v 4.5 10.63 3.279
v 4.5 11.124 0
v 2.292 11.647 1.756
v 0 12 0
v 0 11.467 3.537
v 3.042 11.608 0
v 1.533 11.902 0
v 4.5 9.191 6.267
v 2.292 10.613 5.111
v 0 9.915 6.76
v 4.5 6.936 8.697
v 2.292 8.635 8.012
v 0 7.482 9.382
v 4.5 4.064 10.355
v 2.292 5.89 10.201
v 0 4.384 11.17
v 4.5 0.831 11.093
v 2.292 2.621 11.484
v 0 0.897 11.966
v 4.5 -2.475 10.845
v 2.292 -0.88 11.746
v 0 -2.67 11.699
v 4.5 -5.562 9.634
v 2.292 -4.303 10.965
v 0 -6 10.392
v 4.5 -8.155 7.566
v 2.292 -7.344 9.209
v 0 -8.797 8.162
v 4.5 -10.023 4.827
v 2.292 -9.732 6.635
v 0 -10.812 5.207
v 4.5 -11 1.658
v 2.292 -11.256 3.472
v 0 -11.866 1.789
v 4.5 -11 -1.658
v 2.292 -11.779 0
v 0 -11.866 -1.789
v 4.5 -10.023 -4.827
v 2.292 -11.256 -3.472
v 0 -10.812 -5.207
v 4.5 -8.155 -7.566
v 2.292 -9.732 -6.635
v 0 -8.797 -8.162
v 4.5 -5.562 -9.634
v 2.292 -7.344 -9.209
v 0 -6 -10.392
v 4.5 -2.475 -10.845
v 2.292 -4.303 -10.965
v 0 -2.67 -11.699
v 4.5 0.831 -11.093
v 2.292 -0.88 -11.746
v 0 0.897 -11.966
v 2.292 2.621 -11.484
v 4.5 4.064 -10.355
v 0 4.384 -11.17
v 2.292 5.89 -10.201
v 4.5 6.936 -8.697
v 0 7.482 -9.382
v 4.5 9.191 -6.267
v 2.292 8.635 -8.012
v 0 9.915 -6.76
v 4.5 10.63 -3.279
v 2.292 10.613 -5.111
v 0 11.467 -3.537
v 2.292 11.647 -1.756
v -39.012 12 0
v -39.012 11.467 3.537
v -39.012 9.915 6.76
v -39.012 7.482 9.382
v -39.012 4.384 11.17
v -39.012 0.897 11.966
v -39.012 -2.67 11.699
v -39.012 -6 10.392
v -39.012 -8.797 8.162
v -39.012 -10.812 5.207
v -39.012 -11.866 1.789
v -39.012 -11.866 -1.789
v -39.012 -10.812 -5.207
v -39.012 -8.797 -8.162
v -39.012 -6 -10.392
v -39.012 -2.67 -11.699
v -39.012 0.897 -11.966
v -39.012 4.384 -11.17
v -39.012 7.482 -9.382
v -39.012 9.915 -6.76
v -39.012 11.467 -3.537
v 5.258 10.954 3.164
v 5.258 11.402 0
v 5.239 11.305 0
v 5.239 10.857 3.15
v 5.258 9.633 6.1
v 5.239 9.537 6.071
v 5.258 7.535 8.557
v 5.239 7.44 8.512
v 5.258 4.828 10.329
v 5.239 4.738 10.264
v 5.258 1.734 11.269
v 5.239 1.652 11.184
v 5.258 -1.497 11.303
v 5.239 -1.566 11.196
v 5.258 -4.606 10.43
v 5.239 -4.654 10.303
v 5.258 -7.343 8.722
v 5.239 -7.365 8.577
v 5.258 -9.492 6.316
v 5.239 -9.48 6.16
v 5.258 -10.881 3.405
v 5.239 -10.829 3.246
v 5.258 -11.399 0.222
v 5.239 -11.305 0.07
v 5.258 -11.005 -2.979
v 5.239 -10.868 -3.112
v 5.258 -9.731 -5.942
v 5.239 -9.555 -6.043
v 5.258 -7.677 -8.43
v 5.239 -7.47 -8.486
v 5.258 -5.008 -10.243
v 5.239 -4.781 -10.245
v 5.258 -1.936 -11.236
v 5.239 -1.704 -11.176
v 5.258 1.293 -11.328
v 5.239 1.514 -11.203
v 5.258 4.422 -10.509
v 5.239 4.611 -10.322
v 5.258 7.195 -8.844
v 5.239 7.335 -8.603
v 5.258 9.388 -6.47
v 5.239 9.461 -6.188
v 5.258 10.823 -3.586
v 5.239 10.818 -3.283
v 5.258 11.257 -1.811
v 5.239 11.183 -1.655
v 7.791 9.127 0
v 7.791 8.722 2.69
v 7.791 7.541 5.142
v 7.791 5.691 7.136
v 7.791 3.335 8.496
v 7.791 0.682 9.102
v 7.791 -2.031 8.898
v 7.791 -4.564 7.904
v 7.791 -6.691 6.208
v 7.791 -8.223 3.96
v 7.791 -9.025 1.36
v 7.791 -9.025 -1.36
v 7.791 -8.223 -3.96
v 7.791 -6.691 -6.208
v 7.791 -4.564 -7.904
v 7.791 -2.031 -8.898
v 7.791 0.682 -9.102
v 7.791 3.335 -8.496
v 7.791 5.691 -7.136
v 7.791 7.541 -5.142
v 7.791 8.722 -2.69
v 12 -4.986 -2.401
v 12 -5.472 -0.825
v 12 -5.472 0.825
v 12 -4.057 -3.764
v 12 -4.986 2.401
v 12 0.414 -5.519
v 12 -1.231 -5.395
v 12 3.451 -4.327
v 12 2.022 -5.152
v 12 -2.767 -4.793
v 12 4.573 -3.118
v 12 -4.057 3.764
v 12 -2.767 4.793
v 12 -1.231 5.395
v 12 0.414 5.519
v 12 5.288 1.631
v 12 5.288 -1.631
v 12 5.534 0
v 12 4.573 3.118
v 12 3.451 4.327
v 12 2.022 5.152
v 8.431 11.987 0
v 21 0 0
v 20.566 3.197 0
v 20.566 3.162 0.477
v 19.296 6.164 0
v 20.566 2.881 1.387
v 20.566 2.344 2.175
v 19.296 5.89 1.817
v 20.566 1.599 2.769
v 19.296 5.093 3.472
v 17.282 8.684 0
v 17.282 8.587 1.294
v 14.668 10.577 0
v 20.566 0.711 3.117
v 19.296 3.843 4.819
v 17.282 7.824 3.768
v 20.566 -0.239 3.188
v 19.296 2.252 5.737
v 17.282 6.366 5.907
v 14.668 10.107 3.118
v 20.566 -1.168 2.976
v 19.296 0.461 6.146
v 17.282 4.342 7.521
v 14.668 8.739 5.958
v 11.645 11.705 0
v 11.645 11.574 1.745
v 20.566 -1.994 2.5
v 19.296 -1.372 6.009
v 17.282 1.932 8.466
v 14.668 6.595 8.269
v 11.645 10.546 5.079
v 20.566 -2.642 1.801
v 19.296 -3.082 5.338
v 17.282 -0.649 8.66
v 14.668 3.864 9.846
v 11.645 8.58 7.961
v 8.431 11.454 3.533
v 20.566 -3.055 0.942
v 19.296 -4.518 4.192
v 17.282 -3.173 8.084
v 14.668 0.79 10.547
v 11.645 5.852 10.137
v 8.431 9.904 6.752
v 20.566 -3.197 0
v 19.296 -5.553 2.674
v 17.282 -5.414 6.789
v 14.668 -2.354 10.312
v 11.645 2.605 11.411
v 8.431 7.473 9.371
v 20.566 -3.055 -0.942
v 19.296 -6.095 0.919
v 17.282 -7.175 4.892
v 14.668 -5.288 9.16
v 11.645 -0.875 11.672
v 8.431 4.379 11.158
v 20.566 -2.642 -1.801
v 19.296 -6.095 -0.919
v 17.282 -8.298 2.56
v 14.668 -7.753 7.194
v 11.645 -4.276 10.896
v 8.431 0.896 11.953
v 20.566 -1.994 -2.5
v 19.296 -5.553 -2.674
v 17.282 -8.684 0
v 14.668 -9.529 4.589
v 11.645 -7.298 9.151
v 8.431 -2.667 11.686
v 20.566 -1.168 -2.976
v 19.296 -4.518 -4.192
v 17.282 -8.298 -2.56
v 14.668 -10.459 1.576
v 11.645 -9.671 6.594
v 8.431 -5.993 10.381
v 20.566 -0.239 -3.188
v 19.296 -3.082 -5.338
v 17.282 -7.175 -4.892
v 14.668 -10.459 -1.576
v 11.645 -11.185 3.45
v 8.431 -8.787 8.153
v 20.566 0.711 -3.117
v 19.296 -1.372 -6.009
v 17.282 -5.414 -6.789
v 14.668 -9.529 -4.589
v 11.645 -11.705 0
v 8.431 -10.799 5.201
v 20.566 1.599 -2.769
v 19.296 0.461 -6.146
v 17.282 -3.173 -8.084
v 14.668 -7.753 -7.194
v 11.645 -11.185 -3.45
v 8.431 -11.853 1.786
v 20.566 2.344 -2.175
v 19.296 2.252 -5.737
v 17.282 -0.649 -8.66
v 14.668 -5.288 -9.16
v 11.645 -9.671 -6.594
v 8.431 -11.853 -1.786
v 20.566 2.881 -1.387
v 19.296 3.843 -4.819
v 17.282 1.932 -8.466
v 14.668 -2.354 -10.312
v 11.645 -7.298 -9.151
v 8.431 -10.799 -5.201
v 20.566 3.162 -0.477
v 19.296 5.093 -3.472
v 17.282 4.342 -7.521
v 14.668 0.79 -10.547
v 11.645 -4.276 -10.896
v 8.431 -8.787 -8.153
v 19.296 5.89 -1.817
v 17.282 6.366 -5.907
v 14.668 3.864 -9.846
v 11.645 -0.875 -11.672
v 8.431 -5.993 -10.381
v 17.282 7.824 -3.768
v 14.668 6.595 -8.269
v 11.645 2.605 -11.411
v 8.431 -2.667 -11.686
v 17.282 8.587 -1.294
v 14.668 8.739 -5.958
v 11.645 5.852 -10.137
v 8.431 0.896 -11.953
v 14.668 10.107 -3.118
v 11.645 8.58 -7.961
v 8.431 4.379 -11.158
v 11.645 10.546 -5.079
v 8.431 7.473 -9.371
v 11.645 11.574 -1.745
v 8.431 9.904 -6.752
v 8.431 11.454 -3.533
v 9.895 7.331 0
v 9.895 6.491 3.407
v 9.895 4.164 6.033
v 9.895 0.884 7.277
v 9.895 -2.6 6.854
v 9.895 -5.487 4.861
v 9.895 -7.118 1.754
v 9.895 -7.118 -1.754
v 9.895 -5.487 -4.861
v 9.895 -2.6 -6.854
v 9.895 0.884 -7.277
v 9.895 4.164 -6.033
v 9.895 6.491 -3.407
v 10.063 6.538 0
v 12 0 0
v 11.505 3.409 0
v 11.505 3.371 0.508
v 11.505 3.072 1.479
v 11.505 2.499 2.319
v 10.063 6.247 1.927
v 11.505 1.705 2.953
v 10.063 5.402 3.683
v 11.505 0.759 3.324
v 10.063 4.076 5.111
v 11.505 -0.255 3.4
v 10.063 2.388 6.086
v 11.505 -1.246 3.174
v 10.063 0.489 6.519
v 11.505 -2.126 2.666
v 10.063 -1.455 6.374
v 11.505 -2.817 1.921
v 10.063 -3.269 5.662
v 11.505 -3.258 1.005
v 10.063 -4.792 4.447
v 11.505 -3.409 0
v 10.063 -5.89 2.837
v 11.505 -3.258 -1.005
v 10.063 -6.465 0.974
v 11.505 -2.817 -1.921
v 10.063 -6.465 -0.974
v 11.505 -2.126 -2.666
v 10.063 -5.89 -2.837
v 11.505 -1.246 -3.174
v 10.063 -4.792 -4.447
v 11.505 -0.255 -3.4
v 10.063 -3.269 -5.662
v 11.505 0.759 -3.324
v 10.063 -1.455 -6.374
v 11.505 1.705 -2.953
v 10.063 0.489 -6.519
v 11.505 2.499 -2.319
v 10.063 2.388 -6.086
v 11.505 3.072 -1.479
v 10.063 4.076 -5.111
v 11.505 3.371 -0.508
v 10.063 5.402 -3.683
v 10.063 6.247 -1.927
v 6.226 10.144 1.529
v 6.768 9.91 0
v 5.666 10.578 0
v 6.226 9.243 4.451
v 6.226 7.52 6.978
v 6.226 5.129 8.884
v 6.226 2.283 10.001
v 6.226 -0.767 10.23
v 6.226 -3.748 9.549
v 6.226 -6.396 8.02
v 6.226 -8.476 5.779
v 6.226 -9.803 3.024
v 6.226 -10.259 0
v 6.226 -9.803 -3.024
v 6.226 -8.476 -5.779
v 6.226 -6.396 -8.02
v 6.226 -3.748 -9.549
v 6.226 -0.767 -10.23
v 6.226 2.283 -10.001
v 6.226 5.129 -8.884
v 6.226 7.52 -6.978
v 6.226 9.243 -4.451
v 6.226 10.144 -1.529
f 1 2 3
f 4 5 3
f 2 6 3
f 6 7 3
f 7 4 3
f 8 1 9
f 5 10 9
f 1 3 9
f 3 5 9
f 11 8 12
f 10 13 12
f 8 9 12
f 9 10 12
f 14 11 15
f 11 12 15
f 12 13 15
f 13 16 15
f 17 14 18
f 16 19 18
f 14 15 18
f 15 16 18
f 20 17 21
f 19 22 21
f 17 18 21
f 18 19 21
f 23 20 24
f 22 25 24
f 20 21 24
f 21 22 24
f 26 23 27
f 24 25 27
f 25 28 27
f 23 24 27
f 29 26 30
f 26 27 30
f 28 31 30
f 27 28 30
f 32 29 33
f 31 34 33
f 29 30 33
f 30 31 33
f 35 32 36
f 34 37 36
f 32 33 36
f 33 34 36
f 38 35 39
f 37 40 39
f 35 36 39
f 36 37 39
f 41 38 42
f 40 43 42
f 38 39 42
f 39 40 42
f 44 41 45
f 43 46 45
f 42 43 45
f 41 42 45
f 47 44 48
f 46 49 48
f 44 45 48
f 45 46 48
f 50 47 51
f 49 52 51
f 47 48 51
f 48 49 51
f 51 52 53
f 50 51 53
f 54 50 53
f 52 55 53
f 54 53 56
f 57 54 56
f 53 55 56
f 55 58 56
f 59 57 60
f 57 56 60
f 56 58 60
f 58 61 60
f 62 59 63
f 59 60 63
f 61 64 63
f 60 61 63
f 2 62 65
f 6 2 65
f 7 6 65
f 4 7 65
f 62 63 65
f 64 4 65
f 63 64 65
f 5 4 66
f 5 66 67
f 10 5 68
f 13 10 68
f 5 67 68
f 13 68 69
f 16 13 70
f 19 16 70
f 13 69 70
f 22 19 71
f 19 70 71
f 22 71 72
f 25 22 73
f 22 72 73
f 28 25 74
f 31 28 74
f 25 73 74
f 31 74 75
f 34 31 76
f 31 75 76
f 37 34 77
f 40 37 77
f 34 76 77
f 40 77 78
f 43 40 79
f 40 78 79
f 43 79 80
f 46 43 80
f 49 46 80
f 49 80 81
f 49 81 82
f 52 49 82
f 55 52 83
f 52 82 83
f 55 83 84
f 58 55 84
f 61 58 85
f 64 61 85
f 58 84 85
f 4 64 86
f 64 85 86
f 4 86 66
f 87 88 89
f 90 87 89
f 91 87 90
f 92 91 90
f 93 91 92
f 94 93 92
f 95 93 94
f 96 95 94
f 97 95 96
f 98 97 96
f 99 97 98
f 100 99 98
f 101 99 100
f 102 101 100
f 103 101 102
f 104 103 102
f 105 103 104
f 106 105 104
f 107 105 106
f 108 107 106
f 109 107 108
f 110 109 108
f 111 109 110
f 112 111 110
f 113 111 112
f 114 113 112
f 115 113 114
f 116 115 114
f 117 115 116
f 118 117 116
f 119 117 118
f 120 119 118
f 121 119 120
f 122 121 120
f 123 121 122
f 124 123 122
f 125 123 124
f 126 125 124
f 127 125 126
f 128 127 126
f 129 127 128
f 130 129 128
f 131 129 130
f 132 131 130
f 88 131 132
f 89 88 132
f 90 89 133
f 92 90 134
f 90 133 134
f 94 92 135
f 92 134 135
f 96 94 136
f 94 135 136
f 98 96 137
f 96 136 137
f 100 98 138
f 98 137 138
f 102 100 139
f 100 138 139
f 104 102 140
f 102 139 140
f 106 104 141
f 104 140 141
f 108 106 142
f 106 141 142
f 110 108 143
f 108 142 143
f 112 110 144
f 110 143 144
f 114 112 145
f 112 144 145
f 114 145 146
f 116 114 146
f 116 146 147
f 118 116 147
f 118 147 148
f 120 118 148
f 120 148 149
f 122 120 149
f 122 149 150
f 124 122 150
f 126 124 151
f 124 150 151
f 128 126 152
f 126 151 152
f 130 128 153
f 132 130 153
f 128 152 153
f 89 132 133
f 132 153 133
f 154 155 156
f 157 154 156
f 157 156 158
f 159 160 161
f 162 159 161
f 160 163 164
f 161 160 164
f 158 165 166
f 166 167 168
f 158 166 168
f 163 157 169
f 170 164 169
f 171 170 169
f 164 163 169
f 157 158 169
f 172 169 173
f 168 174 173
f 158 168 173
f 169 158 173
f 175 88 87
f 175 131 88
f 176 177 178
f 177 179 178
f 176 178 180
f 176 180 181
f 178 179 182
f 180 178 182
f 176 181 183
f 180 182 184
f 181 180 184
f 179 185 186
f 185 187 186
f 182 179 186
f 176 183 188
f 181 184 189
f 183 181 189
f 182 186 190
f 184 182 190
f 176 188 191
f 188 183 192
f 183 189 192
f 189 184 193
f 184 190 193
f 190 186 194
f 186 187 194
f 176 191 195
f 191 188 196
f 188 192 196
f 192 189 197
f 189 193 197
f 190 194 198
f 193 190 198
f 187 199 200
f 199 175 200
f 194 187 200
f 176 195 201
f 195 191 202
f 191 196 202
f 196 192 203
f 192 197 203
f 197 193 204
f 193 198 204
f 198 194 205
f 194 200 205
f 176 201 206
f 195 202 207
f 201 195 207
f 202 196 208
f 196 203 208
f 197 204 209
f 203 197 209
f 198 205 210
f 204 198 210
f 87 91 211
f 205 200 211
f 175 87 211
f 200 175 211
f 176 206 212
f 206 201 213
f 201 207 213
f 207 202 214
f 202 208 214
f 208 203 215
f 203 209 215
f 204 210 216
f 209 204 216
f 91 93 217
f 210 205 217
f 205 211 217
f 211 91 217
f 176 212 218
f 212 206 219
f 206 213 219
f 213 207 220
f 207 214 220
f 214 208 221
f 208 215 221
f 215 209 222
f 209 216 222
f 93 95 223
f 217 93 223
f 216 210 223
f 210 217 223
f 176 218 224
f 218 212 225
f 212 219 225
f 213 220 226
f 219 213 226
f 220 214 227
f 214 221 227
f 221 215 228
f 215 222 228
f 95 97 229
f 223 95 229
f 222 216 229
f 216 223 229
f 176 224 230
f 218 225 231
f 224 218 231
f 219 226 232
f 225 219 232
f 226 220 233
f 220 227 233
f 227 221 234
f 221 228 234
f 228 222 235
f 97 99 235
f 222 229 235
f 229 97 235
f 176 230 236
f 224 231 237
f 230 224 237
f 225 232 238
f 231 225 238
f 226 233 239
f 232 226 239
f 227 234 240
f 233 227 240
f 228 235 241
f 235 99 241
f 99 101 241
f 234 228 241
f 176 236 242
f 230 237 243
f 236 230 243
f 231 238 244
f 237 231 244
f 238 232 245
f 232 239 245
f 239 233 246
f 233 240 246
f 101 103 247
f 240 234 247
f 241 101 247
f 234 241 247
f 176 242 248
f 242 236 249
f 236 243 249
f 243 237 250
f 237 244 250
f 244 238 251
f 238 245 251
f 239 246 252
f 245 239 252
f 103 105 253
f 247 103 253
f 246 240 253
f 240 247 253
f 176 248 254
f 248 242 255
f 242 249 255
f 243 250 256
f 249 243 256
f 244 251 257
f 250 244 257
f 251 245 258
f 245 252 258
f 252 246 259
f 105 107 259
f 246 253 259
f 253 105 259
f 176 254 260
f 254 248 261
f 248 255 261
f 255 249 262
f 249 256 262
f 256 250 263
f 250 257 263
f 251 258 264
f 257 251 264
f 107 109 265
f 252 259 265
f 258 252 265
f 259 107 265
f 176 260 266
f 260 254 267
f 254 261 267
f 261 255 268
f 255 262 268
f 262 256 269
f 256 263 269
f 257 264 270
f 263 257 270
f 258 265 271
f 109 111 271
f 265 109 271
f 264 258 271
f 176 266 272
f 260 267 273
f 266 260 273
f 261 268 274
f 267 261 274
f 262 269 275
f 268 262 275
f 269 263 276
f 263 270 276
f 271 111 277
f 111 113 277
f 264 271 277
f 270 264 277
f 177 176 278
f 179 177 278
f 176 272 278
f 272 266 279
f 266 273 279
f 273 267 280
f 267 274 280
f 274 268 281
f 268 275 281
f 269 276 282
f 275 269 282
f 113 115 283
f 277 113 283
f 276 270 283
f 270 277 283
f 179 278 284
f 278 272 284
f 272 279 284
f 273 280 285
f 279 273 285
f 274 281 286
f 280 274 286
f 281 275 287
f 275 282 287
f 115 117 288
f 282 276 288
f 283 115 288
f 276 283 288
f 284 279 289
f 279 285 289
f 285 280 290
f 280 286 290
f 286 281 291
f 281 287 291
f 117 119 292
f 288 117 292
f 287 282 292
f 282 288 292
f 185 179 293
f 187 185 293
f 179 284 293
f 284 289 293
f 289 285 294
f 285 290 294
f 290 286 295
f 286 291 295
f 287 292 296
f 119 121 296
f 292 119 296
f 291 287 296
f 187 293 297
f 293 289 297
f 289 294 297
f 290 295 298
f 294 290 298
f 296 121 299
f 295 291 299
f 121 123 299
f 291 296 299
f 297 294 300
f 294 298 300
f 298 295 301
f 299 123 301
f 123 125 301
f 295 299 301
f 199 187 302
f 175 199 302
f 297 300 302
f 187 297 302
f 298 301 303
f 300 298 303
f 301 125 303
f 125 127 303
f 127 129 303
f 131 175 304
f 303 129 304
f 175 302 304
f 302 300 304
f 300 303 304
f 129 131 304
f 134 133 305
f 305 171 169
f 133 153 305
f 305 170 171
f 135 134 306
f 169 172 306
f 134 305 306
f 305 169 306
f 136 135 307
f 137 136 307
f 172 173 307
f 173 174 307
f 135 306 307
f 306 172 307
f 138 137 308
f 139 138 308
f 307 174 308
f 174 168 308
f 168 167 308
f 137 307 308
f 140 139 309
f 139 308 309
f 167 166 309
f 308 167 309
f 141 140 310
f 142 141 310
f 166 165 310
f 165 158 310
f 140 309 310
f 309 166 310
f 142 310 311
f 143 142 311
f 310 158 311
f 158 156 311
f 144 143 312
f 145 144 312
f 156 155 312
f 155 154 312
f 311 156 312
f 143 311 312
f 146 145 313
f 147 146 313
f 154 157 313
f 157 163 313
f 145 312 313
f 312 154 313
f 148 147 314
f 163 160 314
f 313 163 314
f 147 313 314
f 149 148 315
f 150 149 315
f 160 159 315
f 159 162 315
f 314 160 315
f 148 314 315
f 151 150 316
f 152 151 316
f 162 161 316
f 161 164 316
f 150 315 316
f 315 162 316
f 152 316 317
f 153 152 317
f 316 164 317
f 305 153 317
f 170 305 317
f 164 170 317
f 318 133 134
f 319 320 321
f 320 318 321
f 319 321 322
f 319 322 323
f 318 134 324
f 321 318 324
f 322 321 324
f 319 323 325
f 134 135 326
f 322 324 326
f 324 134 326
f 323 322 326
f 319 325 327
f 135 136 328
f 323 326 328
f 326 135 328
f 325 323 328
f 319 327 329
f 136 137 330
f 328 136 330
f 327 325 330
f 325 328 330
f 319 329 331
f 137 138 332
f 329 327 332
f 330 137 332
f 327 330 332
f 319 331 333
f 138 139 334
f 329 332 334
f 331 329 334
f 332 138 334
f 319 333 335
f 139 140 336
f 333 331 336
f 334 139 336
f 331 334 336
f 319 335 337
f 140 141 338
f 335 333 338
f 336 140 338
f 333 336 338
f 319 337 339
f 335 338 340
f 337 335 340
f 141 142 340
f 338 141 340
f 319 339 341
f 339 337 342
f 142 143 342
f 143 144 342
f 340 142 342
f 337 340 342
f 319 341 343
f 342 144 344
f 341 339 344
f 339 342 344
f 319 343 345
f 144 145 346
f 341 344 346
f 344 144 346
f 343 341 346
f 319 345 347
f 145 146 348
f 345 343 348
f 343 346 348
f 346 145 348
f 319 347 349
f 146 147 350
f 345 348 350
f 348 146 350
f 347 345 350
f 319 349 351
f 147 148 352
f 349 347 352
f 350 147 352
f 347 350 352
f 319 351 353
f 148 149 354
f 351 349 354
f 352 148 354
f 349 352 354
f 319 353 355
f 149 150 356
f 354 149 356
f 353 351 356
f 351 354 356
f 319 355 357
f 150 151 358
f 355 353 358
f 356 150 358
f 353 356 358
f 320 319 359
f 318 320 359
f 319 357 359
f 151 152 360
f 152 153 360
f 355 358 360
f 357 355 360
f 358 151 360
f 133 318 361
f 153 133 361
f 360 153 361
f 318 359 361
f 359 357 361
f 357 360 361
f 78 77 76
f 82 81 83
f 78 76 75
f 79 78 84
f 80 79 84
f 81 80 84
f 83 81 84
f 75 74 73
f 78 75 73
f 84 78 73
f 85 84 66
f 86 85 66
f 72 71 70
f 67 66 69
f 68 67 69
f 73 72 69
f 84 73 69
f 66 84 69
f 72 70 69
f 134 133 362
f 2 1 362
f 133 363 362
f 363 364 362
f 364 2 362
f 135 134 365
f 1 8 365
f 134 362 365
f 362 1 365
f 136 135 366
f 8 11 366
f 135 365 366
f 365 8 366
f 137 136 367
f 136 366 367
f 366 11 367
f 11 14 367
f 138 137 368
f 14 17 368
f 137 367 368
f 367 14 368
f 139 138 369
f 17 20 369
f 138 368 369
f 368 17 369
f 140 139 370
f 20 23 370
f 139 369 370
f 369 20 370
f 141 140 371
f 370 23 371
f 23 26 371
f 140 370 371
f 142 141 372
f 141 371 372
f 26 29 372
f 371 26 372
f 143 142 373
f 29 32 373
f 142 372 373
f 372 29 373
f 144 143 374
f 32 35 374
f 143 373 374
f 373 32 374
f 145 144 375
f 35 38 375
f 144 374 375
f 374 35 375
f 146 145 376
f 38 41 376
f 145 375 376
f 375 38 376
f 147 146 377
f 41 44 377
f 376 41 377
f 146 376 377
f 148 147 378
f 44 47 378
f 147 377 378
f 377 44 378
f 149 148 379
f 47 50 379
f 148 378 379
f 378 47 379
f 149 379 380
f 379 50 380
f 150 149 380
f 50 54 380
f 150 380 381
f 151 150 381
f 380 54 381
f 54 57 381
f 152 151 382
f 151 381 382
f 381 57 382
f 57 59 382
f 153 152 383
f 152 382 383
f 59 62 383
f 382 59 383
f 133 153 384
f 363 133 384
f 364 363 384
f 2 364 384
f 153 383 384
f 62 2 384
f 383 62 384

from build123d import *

# Parameters (mm, degrees)
F3_SIZE = 0.1


with BuildPart() as f1:
    # F0 (on Top) → F1 (revolve)
    with BuildSketch(Plane.XY):
        with BuildLine():
            Line((-39.011973466, 0), (-12, 0))
            ThreePointArc((-12, 0), (-8.4852813742, 8.4852813742), (0, 12))
            Line((0, 12), (-39.011973466, 12))
            Line((-39.011973466, 12), (-39.011973466, 0))
        make_face()
        with BuildLine():
            Line((-12, 0), (-3, 0))
            ThreePointArc((-3, 0), (-0.9498743711, 6.7082039325), (4.5, 11.1242977306))
            ThreePointArc((4.5, 11.1242977306), (2.2922071495, 11.77904013), (0, 12))
            ThreePointArc((0, 12), (-8.4852813742, 8.4852813742), (-12, 0))
        make_face()
        with BuildLine():
            Line((-3, 0), (12, 0))
            ThreePointArc((12, 0), (10.8969682166, 5.0255431236), (7.7906527188, 9.1271972815))
            ThreePointArc((7.7906527188, 9.1271972815), (6.2259247196, 10.2585506474), (4.5, 11.1242977306))
            ThreePointArc((4.5, 11.1242977306), (-0.9498743711, 6.7082039325), (-3, 0))
        make_face()
    revolve(axis=Axis((-1.505986733, 0, 0), (1, 0, 0)))


with BuildPart() as f2:
    # F0 (on Top) → F2 (revolve)
    with BuildSketch(Plane.XY):
        with BuildLine():
            Line((12, 5.5342473054), (12, 0))
            Line((12, 0), (21, 0))
            ThreePointArc((21, 0), (15.9984447223, 9.7479111336), (5.1630380886, 11.3700362045))
            Line((5.1630380886, 11.3700362045), (7.7906527188, 9.1271972815))
            Line((7.7906527188, 9.1271972815), (12, 5.5342473054))
        make_face()
    revolve(axis=Axis((-1.505986733, 0, 0), (1, 0, 0)))

    # F3
    f3_edges = [f2.edges().sort_by_distance(p)[0] for p in [
        (5.163038, -11.370036, 0),
    ]]
    chamfer(f3_edges, length=F3_SIZE)


solid = Compound([f1.part, f2.part])
